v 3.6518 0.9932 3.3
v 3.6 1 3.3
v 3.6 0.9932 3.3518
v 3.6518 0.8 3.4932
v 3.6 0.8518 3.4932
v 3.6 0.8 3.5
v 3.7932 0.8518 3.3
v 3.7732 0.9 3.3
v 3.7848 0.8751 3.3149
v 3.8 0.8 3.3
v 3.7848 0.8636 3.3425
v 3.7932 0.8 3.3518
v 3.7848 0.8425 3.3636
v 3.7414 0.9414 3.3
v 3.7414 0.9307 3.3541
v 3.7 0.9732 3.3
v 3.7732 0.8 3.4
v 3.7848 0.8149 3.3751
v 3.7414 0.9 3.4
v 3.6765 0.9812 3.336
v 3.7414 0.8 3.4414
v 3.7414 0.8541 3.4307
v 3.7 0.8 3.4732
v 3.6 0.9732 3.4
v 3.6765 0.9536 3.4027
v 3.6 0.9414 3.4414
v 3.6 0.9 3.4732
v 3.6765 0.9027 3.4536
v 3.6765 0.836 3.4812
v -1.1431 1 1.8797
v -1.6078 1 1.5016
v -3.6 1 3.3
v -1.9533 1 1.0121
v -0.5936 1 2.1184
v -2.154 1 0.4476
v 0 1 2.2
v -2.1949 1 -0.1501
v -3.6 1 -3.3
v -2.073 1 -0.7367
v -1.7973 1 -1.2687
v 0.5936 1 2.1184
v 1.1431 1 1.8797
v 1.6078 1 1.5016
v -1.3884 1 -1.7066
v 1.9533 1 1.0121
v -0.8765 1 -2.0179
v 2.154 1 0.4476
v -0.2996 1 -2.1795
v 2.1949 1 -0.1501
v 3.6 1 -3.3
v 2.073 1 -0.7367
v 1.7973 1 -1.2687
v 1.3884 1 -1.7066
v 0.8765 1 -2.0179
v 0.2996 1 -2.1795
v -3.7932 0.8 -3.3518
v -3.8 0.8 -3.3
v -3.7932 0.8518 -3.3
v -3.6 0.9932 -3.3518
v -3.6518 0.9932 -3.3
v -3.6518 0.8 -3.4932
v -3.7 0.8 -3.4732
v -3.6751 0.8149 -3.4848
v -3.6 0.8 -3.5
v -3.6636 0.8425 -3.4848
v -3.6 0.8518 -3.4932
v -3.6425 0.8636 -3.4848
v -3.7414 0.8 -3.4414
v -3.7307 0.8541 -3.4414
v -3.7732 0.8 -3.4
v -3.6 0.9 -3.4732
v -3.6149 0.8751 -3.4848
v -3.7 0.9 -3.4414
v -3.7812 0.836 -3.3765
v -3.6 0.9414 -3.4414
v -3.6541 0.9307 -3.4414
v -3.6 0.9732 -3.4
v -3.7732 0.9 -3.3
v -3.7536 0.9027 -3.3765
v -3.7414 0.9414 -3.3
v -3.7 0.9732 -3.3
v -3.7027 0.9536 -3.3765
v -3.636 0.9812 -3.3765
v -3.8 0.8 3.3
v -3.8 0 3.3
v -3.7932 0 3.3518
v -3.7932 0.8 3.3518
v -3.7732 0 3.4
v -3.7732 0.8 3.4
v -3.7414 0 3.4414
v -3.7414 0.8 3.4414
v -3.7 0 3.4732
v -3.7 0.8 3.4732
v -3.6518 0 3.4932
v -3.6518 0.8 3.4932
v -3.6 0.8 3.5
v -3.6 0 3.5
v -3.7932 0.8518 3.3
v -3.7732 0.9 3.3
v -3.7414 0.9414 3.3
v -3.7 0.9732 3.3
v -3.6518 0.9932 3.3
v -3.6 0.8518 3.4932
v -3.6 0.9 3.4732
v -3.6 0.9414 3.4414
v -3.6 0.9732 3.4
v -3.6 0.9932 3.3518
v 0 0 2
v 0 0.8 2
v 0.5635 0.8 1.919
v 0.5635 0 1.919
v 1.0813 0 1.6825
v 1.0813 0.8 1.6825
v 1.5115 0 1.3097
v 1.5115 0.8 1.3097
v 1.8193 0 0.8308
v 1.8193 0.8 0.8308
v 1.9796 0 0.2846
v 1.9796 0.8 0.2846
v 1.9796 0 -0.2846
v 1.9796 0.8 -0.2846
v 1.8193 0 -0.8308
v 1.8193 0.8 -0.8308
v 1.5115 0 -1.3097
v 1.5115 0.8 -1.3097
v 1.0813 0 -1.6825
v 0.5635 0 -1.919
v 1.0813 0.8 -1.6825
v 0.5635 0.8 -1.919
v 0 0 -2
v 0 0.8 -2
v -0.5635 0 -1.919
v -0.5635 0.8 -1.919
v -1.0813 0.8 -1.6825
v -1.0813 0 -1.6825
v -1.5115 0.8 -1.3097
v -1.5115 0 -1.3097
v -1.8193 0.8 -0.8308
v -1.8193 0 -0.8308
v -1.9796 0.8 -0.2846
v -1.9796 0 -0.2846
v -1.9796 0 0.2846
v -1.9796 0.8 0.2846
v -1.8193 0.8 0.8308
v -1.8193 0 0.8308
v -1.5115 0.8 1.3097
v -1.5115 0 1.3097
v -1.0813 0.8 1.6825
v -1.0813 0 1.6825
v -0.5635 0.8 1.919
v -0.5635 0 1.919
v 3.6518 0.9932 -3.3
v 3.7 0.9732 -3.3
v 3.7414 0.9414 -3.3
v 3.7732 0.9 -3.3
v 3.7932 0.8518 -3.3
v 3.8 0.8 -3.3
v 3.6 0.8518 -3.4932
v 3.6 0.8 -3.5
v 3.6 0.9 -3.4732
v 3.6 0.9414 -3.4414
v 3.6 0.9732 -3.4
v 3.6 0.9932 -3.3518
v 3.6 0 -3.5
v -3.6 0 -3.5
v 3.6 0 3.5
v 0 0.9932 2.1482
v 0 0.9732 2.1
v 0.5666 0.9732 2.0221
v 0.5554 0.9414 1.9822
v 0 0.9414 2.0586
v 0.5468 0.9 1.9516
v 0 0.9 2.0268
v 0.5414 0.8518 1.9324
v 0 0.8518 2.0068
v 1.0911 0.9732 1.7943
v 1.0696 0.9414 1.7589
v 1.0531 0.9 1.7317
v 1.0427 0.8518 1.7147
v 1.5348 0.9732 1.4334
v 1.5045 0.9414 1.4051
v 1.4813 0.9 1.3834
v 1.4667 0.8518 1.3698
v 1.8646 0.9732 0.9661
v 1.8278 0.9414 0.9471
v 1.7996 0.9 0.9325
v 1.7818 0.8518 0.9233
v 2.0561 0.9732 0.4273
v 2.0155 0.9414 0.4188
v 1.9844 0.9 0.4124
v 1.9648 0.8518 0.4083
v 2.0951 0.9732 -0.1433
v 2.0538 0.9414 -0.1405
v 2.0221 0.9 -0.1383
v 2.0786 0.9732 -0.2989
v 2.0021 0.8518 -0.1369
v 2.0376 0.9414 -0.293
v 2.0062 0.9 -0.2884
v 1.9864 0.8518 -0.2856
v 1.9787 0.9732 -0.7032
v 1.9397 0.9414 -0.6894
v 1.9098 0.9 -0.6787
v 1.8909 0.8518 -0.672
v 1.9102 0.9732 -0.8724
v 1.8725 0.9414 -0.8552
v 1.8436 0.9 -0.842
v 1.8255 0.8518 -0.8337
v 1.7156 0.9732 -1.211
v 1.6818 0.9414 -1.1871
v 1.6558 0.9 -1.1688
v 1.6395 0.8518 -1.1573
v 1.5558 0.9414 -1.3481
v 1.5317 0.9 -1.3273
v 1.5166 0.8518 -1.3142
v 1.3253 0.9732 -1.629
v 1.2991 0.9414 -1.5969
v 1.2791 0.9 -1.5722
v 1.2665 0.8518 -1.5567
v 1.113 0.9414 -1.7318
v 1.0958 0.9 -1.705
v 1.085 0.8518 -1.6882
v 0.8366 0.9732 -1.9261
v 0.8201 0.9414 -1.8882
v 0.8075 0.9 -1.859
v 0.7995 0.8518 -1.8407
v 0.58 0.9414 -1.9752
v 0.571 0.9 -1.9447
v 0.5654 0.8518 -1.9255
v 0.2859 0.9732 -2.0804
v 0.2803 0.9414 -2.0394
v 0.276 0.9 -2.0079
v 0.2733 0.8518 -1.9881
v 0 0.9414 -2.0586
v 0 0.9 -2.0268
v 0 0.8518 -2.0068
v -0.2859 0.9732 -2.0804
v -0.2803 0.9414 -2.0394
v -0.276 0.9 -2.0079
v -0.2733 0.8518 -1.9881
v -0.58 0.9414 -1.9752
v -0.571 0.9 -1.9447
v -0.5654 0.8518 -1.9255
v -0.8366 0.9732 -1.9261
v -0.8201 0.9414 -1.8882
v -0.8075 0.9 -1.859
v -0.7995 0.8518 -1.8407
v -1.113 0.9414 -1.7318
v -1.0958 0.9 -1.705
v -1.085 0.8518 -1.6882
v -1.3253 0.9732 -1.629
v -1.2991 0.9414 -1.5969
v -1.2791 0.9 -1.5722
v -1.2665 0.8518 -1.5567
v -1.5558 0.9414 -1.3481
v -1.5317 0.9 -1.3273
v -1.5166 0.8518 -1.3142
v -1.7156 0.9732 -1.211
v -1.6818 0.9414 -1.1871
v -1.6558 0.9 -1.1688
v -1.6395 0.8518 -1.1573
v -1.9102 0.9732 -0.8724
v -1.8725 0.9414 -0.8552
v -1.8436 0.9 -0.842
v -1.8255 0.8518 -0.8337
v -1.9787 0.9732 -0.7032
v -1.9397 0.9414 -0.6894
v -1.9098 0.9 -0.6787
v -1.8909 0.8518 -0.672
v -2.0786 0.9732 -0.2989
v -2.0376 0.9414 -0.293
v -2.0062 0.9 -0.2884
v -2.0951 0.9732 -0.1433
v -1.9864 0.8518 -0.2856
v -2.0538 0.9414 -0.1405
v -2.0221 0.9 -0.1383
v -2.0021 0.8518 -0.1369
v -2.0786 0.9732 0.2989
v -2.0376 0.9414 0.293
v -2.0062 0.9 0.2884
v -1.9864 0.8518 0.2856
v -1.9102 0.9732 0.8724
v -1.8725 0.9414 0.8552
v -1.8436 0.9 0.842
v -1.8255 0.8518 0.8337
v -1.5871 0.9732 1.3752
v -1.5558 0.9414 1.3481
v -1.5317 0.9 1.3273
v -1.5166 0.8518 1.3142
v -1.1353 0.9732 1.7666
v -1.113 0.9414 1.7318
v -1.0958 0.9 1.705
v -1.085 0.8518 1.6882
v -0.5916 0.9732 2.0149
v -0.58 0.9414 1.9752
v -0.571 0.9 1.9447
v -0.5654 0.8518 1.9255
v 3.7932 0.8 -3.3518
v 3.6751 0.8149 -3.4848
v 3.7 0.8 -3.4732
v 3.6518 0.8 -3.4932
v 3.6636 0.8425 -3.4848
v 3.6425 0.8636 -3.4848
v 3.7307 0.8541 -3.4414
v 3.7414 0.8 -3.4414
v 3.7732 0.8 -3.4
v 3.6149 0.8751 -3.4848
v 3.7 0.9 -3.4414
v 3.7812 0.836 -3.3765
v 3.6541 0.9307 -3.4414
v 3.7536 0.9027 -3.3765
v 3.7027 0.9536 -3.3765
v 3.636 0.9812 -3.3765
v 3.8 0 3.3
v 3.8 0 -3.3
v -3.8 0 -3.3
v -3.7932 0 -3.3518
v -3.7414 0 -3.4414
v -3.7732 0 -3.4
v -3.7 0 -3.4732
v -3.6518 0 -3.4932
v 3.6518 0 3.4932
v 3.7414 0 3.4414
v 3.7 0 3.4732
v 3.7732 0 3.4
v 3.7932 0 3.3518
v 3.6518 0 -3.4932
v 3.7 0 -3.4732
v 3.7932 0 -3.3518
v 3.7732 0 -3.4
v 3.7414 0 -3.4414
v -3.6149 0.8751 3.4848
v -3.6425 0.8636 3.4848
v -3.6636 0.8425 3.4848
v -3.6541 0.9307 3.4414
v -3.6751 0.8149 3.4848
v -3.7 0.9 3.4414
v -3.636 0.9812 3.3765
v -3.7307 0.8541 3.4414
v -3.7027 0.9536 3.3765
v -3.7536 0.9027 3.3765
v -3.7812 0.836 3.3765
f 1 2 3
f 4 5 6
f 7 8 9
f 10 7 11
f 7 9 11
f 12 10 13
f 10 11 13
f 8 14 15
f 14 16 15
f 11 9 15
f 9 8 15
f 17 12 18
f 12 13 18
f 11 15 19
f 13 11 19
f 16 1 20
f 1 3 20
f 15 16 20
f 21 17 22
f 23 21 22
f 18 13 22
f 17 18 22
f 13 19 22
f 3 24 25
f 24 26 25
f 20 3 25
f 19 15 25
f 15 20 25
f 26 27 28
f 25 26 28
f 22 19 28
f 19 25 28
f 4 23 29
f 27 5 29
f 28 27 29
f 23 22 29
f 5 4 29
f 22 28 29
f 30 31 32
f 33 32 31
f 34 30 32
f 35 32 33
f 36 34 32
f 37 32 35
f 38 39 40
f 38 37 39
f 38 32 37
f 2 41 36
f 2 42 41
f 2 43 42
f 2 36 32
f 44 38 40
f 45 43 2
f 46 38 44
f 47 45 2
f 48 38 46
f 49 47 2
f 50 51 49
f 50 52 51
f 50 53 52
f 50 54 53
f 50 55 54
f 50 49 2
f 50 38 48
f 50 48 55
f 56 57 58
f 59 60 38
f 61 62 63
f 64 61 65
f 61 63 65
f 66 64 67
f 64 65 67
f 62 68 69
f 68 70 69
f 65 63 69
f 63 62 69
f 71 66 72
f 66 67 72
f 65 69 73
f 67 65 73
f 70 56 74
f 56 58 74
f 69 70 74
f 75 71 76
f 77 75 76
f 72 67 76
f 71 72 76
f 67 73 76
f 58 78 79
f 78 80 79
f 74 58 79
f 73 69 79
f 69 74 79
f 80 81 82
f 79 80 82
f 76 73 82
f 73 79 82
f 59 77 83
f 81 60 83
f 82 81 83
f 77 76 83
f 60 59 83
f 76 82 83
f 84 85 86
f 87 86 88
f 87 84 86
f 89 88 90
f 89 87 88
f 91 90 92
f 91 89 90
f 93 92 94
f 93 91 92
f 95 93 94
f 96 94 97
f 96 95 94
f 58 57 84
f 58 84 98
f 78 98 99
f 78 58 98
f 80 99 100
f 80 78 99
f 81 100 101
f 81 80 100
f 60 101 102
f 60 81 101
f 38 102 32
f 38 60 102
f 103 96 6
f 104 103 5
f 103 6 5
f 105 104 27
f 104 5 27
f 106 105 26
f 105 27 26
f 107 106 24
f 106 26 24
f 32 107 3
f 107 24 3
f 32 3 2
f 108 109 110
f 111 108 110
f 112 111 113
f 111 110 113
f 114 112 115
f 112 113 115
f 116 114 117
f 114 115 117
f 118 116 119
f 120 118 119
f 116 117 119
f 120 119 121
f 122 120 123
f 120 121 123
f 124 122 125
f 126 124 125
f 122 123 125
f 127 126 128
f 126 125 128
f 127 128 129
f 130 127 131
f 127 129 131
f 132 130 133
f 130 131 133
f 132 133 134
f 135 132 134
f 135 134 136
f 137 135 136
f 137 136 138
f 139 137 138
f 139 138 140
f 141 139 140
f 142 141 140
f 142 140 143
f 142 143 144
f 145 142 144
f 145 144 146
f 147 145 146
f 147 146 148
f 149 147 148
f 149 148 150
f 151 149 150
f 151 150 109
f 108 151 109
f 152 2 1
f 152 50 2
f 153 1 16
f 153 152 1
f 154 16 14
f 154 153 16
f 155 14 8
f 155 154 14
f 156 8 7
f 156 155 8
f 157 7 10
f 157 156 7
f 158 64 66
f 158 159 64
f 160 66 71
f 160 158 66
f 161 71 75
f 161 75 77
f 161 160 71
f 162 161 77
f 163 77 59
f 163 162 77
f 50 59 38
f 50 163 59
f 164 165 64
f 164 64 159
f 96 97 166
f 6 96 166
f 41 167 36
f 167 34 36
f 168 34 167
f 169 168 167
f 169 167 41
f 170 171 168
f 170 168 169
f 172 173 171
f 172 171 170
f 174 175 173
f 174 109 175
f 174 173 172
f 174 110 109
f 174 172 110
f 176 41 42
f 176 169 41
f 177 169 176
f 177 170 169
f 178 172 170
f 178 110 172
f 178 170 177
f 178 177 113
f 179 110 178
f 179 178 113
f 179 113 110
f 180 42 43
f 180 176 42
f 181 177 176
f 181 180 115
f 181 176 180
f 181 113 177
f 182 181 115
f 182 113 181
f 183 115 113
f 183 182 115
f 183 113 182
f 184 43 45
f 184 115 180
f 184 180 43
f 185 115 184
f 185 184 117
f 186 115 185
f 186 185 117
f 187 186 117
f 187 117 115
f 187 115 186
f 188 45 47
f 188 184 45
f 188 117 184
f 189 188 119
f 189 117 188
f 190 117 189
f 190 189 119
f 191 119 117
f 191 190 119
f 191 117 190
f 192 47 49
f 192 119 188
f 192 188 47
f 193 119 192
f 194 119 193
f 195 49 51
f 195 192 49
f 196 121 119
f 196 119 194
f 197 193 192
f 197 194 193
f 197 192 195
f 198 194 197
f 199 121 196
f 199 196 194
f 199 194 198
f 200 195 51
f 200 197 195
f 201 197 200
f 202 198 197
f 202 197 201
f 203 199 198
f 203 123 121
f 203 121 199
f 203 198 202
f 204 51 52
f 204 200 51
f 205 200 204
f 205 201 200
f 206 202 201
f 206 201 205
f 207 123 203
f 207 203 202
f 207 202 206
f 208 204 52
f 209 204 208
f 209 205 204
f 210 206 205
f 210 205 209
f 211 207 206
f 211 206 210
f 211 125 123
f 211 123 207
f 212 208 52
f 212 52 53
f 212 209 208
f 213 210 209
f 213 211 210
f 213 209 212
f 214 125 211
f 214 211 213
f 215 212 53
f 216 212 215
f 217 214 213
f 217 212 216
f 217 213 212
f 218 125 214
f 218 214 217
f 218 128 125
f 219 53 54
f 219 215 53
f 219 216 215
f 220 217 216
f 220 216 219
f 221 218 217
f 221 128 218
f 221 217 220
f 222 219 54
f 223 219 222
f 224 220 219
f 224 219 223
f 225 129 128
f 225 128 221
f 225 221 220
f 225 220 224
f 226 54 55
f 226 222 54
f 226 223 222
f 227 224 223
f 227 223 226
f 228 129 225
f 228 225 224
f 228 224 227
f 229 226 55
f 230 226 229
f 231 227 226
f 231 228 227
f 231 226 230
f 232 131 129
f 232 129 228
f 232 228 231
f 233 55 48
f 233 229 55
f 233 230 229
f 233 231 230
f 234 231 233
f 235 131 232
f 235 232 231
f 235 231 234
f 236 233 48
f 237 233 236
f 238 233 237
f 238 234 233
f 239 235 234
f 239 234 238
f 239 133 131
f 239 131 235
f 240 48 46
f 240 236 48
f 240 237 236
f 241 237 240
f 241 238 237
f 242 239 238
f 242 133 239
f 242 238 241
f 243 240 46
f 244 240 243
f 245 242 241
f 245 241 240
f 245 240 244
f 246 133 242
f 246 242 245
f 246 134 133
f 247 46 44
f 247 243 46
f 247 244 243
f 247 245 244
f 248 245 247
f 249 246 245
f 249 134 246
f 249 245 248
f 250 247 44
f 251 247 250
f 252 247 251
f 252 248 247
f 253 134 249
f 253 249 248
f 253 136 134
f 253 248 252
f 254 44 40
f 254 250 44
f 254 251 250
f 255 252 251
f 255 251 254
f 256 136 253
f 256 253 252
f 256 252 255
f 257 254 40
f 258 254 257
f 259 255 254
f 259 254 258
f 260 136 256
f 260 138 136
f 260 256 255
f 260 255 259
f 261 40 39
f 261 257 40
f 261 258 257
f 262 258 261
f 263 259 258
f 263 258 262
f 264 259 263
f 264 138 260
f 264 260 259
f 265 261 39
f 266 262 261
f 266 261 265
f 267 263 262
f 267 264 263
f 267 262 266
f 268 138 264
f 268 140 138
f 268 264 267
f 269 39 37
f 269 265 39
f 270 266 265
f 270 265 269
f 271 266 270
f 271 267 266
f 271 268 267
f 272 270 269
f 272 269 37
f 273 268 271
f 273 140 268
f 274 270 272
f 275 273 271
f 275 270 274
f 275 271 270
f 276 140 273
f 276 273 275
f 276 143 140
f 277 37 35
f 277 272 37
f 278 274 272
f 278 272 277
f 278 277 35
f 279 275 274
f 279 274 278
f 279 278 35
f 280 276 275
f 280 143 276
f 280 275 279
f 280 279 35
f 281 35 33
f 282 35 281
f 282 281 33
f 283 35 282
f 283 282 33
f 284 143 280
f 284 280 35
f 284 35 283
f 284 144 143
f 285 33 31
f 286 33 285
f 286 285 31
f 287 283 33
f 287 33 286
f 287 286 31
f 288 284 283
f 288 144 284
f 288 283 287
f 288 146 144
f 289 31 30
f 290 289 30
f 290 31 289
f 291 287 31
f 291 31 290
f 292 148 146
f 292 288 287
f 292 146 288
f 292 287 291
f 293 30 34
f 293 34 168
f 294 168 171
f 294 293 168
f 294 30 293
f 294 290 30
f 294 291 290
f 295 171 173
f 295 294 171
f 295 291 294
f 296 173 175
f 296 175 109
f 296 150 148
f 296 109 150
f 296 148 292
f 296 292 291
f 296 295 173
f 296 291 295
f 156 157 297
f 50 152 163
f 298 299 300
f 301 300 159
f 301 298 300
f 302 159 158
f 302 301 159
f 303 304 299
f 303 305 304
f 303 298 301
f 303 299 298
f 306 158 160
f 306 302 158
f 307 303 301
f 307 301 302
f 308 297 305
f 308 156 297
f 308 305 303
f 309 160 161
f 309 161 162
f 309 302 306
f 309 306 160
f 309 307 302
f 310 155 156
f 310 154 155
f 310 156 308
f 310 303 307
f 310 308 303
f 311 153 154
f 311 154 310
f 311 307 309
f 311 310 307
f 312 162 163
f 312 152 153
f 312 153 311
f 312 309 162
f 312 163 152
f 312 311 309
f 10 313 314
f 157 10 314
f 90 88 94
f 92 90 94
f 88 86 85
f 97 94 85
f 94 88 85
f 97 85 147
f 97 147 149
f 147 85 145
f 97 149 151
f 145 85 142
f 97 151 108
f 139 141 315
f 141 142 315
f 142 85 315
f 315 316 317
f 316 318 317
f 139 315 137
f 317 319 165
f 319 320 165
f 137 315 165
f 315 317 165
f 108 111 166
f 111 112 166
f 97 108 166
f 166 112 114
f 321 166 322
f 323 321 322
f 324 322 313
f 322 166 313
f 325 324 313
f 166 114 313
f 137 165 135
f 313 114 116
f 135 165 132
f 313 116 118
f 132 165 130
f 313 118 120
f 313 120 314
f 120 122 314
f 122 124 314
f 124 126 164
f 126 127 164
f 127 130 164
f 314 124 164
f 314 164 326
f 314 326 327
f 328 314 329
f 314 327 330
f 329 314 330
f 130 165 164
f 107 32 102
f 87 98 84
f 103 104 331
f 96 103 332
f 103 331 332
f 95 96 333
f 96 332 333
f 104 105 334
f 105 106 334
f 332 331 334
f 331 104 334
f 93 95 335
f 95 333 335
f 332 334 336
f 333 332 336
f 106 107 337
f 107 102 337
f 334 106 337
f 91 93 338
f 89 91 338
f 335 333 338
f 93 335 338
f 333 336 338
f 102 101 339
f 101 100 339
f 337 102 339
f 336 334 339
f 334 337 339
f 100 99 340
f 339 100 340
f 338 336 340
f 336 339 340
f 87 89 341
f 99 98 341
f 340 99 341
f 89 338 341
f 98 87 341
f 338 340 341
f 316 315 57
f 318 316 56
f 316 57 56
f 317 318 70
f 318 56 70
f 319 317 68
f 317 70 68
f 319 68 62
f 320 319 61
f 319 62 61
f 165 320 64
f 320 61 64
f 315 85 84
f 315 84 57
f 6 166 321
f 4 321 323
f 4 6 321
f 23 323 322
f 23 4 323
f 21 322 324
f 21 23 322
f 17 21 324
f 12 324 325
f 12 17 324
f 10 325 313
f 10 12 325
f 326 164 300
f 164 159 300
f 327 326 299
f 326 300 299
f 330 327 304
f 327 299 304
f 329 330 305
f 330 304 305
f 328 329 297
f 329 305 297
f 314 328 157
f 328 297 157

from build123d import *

# Parameters (mm, degrees)
SKETCH1_W           = 7.6
SKETCH1_H           = 7
BOSS_EXTRUDE1_DEPTH = 1
SKETCH2_R           = 2
CUT_EXTRUDE1_DEPTH  = 6.262128847
FILLET1_R           = 0.2


with BuildPart() as part:
    # Sketch1 → Boss-Extrude1 (new body)
    with BuildSketch(Plane(origin=(0, 0, 0), x_dir=(1, 0, 0), z_dir=(0, 1, 0))):
        Rectangle(SKETCH1_W, SKETCH1_H)
    extrude(amount=BOSS_EXTRUDE1_DEPTH)

    # Sketch2 → Cut-Extrude1 (cut, through all)
    with BuildSketch(Plane(origin=(0, 1, 0), x_dir=(1, 0, 0), z_dir=(0, 1, 0))):
        with Locations(Location((0, 0, 0), (0, 0, 270))):
            Circle(SKETCH2_R)
    extrude(amount=-CUT_EXTRUDE1_DEPTH, mode=Mode.SUBTRACT)

    # Fillet1
    fillet1_edges = [part.edges().sort_by_distance(p)[0] for p in [
        (-3.8, 1, 0),
        (0, 1, -2),
        (0, 1, 3.5),
        (3.8, 1, 0),
        (3.8, 0.5, 3.5),
        (-3.8, 0.5, 3.5),
        (-3.8, 0.5, -3.5),
        (3.8, 0.5, -3.5),
        (0, 1, -3.5),
    ]]
    fillet(fillet1_edges, radius=FILLET1_R)


solid = part.part
